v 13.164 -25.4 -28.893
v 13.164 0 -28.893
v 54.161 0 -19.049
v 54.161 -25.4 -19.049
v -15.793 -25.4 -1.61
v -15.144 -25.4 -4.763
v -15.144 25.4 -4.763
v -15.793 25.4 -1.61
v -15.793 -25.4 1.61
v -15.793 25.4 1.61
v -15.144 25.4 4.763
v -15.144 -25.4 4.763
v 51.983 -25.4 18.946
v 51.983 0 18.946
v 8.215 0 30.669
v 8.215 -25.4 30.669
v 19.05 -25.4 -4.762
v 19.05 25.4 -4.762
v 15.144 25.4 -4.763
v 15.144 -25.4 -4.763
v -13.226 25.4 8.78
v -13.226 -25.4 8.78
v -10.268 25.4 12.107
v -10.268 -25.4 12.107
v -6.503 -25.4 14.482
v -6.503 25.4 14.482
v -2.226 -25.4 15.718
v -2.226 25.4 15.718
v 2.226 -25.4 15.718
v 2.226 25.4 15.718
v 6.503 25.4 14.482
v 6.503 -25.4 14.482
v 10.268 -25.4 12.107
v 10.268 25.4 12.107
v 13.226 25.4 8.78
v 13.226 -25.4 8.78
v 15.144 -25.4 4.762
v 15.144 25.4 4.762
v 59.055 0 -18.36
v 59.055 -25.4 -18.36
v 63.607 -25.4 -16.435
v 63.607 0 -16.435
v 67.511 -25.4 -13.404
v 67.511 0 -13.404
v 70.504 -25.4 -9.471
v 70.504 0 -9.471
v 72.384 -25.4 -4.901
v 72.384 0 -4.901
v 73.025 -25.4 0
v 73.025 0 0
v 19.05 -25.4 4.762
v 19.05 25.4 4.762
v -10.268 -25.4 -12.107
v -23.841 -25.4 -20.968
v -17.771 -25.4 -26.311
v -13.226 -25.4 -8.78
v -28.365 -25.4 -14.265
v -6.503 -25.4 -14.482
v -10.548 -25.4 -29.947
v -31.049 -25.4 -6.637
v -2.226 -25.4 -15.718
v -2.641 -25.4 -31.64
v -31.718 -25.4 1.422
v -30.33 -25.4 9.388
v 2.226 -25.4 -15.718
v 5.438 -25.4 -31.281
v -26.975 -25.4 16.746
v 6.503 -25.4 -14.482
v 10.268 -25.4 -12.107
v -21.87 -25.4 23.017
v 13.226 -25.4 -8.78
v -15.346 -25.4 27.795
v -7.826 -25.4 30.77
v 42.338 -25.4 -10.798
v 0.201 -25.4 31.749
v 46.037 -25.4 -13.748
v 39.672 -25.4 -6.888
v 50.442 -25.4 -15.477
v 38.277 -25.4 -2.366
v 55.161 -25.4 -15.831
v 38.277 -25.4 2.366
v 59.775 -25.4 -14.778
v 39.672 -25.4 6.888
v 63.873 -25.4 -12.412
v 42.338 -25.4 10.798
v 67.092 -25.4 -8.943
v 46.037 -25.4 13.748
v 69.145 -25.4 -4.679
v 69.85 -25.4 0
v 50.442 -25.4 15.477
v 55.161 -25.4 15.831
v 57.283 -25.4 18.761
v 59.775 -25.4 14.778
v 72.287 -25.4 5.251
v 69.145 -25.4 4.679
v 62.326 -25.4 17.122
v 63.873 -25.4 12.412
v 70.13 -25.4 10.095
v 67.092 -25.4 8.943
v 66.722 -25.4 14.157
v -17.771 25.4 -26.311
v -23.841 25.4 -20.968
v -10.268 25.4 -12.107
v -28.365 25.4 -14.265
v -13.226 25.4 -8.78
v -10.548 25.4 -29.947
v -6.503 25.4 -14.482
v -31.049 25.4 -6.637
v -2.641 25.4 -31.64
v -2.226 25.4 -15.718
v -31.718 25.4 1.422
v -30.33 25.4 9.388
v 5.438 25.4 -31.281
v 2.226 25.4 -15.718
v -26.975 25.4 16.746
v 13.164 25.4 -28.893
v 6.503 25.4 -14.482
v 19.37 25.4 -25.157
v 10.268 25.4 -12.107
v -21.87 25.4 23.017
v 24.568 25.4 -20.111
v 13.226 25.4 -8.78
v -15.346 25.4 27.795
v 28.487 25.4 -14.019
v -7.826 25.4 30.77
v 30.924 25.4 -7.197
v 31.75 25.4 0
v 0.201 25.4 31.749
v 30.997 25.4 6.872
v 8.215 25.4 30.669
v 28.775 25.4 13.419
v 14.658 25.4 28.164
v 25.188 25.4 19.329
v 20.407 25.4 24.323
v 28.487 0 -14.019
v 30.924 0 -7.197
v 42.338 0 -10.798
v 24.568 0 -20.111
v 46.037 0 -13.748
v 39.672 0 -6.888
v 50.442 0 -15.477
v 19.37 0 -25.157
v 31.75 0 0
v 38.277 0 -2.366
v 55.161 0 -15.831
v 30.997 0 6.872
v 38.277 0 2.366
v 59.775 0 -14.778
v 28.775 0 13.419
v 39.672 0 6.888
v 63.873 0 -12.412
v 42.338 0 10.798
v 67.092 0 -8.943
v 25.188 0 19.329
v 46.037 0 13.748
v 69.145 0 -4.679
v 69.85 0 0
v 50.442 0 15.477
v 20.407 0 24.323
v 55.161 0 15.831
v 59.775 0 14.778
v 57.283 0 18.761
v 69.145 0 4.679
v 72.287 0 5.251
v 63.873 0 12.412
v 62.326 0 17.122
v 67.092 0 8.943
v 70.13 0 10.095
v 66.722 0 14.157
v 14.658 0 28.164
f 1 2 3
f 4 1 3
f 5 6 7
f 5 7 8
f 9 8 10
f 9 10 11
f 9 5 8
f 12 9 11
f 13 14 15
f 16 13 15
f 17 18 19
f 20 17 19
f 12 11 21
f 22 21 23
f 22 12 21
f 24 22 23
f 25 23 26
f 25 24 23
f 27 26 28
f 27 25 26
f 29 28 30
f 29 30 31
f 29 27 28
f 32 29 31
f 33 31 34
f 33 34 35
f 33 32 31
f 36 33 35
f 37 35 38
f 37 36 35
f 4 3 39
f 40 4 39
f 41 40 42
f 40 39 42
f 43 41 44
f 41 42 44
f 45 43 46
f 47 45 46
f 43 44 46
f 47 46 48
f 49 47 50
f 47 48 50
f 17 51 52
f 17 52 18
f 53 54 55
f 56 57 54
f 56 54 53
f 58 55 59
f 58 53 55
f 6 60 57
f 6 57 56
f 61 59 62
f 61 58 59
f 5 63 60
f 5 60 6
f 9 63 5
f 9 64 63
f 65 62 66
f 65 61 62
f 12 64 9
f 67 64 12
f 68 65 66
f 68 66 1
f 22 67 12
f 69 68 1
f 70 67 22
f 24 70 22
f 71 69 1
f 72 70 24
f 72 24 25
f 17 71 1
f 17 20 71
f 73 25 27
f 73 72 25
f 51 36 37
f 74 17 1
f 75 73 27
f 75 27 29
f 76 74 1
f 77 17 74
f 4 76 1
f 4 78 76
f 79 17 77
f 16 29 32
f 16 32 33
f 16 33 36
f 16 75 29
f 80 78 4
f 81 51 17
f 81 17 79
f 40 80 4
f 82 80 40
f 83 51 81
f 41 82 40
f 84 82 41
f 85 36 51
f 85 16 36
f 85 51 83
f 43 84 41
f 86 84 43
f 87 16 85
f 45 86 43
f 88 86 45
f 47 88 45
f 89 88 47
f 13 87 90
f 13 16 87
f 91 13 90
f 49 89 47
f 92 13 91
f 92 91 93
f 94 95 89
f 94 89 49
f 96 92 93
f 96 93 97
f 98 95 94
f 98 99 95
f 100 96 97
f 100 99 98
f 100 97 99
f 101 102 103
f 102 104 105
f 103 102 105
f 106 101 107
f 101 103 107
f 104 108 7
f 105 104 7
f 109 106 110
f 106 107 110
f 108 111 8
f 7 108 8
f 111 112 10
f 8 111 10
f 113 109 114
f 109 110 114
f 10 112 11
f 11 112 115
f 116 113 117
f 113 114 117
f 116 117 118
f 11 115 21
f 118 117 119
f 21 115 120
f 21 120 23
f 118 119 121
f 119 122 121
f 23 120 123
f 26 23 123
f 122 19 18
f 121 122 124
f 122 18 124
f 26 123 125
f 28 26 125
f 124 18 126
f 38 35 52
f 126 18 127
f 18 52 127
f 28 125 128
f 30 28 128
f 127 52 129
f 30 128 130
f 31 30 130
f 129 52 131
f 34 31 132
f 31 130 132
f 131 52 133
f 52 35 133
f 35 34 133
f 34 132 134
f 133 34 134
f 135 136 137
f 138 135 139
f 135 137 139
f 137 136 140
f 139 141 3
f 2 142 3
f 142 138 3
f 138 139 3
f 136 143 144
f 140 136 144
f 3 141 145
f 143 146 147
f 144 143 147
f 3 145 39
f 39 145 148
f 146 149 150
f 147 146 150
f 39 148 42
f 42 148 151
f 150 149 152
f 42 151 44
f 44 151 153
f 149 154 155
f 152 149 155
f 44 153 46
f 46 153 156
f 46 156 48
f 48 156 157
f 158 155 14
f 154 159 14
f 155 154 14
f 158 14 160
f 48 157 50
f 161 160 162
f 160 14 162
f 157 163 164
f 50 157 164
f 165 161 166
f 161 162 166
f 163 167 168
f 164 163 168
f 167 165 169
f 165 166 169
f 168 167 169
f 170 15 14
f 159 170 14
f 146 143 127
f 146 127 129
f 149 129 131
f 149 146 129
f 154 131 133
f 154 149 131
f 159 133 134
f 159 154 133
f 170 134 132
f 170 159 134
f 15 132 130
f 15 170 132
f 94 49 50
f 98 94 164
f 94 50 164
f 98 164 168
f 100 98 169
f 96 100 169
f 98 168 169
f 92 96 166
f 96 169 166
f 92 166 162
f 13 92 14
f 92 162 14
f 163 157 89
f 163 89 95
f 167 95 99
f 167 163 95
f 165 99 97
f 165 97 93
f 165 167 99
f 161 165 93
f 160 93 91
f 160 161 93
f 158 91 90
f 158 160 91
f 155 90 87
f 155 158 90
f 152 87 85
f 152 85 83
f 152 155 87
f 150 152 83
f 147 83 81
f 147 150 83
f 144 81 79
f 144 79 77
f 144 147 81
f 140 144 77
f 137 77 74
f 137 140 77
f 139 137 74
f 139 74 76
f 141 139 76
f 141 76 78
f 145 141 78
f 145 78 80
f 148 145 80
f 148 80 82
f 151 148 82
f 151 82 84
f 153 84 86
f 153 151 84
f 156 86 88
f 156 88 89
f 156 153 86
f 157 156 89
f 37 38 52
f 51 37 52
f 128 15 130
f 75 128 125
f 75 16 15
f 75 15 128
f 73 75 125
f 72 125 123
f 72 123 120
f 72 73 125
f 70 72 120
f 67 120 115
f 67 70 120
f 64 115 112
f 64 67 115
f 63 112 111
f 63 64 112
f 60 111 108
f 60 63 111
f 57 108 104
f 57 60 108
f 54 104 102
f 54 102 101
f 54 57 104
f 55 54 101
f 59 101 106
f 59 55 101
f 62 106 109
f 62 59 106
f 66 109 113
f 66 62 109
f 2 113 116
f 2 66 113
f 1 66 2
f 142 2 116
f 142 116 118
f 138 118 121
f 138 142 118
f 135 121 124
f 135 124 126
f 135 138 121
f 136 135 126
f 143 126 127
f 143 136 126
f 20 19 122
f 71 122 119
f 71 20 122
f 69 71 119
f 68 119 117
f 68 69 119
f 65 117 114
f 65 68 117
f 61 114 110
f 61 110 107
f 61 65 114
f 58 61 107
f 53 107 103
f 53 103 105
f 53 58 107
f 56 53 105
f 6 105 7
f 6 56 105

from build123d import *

# Parameters (mm, degrees)
F0_R     = 15.875
F1_DEPTH = 25.4
F2_DEPTH = 25.4


with BuildPart() as f1:
    # F0 (on Front) → F1 (new body)
    with BuildSketch(Plane.XZ):
        with BuildLine():
            ThreePointArc((13.163634, -28.892581), (26.702134, -17.177269), (31.75, 0))
            ThreePointArc((31.75, 0), (25.188056, 19.329365), (8.214608, 30.668921))
            ThreePointArc((8.214608, 30.668921), (-31.640961, -2.62908), (13.163634, -28.892581))
        make_face()
        with BuildLine():
            ThreePointArc((-15.143785, 4.7625), (0, 15.875), (15.143785, 4.7625))
            Line((15.143785, 4.7625), (19.05, 4.7625))
            Line((19.05, 4.7625), (19.05, -4.7625))
            Line((19.05, -4.7625), (15.143785, -4.7625))
            ThreePointArc((15.143785, -4.7625), (0, -15.875), (-15.143785, -4.7625))
            Line((-15.143785, -4.7625), (-19.05, -4.7625))
            Line((-19.05, -4.7625), (-19.05, 4.7625))
            Line((-19.05, 4.7625), (-15.143785, 4.7625))
        make_face(mode=Mode.SUBTRACT)
        with BuildLine():
            ThreePointArc((73.025, 0), (66.721746, 14.157082), (51.983218, 18.945588))
            ThreePointArc((51.983218, 18.945588), (34.956217, -1.090134), (54.161027, -19.049092))
            ThreePointArc((54.161027, -19.049092), (67.510995, -13.404452), (73.025, 0))
        make_face()
        with Locations((53.975, 0)):
            Circle(F0_R, mode=Mode.SUBTRACT)
        with BuildLine():
            ThreePointArc((8.214608, 30.668921), (25.188056, 19.329365), (31.75, 0))
            ThreePointArc((31.75, 0), (26.702134, -17.177269), (13.163634, -28.892581))
            Line((13.163634, -28.892581), (54.161027, -19.049092))
            ThreePointArc((54.161027, -19.049092), (34.956217, -1.090134), (51.983218, 18.945588))
            Line((51.983218, 18.945588), (8.214608, 30.668921))
        make_face()
        with BuildLine():
            ThreePointArc((-15.143785, -4.7625), (-15.875, 0), (-15.143785, 4.7625))
            Line((-15.143785, 4.7625), (-19.05, 4.7625))
            Line((-19.05, 4.7625), (-19.05, -4.7625))
            Line((-19.05, -4.7625), (-15.143785, -4.7625))
        make_face()
    extrude(amount=F1_DEPTH)

    # F0 (on Front) → F2 (join)
    with BuildSketch(Plane.XZ):
        with BuildLine():
            ThreePointArc((13.163634, -28.892581), (26.702134, -17.177269), (31.75, 0))
            ThreePointArc((31.75, 0), (25.188056, 19.329365), (8.214608, 30.668921))
            ThreePointArc((8.214608, 30.668921), (-31.640961, -2.62908), (13.163634, -28.892581))
        make_face()
        with BuildLine():
            ThreePointArc((-15.143785, 4.7625), (0, 15.875), (15.143785, 4.7625))
            Line((15.143785, 4.7625), (19.05, 4.7625))
            Line((19.05, 4.7625), (19.05, -4.7625))
            Line((19.05, -4.7625), (15.143785, -4.7625))
            ThreePointArc((15.143785, -4.7625), (0, -15.875), (-15.143785, -4.7625))
            Line((-15.143785, -4.7625), (-19.05, -4.7625))
            Line((-19.05, -4.7625), (-19.05, 4.7625))
            Line((-19.05, 4.7625), (-15.143785, 4.7625))
        make_face(mode=Mode.SUBTRACT)
        with BuildLine():
            ThreePointArc((-15.143785, -4.7625), (-15.875, 0), (-15.143785, 4.7625))
            Line((-15.143785, 4.7625), (-19.05, 4.7625))
            Line((-19.05, 4.7625), (-19.05, -4.7625))
            Line((-19.05, -4.7625), (-15.143785, -4.7625))
        make_face()
    extrude(amount=-F2_DEPTH)


solid = f1.part
